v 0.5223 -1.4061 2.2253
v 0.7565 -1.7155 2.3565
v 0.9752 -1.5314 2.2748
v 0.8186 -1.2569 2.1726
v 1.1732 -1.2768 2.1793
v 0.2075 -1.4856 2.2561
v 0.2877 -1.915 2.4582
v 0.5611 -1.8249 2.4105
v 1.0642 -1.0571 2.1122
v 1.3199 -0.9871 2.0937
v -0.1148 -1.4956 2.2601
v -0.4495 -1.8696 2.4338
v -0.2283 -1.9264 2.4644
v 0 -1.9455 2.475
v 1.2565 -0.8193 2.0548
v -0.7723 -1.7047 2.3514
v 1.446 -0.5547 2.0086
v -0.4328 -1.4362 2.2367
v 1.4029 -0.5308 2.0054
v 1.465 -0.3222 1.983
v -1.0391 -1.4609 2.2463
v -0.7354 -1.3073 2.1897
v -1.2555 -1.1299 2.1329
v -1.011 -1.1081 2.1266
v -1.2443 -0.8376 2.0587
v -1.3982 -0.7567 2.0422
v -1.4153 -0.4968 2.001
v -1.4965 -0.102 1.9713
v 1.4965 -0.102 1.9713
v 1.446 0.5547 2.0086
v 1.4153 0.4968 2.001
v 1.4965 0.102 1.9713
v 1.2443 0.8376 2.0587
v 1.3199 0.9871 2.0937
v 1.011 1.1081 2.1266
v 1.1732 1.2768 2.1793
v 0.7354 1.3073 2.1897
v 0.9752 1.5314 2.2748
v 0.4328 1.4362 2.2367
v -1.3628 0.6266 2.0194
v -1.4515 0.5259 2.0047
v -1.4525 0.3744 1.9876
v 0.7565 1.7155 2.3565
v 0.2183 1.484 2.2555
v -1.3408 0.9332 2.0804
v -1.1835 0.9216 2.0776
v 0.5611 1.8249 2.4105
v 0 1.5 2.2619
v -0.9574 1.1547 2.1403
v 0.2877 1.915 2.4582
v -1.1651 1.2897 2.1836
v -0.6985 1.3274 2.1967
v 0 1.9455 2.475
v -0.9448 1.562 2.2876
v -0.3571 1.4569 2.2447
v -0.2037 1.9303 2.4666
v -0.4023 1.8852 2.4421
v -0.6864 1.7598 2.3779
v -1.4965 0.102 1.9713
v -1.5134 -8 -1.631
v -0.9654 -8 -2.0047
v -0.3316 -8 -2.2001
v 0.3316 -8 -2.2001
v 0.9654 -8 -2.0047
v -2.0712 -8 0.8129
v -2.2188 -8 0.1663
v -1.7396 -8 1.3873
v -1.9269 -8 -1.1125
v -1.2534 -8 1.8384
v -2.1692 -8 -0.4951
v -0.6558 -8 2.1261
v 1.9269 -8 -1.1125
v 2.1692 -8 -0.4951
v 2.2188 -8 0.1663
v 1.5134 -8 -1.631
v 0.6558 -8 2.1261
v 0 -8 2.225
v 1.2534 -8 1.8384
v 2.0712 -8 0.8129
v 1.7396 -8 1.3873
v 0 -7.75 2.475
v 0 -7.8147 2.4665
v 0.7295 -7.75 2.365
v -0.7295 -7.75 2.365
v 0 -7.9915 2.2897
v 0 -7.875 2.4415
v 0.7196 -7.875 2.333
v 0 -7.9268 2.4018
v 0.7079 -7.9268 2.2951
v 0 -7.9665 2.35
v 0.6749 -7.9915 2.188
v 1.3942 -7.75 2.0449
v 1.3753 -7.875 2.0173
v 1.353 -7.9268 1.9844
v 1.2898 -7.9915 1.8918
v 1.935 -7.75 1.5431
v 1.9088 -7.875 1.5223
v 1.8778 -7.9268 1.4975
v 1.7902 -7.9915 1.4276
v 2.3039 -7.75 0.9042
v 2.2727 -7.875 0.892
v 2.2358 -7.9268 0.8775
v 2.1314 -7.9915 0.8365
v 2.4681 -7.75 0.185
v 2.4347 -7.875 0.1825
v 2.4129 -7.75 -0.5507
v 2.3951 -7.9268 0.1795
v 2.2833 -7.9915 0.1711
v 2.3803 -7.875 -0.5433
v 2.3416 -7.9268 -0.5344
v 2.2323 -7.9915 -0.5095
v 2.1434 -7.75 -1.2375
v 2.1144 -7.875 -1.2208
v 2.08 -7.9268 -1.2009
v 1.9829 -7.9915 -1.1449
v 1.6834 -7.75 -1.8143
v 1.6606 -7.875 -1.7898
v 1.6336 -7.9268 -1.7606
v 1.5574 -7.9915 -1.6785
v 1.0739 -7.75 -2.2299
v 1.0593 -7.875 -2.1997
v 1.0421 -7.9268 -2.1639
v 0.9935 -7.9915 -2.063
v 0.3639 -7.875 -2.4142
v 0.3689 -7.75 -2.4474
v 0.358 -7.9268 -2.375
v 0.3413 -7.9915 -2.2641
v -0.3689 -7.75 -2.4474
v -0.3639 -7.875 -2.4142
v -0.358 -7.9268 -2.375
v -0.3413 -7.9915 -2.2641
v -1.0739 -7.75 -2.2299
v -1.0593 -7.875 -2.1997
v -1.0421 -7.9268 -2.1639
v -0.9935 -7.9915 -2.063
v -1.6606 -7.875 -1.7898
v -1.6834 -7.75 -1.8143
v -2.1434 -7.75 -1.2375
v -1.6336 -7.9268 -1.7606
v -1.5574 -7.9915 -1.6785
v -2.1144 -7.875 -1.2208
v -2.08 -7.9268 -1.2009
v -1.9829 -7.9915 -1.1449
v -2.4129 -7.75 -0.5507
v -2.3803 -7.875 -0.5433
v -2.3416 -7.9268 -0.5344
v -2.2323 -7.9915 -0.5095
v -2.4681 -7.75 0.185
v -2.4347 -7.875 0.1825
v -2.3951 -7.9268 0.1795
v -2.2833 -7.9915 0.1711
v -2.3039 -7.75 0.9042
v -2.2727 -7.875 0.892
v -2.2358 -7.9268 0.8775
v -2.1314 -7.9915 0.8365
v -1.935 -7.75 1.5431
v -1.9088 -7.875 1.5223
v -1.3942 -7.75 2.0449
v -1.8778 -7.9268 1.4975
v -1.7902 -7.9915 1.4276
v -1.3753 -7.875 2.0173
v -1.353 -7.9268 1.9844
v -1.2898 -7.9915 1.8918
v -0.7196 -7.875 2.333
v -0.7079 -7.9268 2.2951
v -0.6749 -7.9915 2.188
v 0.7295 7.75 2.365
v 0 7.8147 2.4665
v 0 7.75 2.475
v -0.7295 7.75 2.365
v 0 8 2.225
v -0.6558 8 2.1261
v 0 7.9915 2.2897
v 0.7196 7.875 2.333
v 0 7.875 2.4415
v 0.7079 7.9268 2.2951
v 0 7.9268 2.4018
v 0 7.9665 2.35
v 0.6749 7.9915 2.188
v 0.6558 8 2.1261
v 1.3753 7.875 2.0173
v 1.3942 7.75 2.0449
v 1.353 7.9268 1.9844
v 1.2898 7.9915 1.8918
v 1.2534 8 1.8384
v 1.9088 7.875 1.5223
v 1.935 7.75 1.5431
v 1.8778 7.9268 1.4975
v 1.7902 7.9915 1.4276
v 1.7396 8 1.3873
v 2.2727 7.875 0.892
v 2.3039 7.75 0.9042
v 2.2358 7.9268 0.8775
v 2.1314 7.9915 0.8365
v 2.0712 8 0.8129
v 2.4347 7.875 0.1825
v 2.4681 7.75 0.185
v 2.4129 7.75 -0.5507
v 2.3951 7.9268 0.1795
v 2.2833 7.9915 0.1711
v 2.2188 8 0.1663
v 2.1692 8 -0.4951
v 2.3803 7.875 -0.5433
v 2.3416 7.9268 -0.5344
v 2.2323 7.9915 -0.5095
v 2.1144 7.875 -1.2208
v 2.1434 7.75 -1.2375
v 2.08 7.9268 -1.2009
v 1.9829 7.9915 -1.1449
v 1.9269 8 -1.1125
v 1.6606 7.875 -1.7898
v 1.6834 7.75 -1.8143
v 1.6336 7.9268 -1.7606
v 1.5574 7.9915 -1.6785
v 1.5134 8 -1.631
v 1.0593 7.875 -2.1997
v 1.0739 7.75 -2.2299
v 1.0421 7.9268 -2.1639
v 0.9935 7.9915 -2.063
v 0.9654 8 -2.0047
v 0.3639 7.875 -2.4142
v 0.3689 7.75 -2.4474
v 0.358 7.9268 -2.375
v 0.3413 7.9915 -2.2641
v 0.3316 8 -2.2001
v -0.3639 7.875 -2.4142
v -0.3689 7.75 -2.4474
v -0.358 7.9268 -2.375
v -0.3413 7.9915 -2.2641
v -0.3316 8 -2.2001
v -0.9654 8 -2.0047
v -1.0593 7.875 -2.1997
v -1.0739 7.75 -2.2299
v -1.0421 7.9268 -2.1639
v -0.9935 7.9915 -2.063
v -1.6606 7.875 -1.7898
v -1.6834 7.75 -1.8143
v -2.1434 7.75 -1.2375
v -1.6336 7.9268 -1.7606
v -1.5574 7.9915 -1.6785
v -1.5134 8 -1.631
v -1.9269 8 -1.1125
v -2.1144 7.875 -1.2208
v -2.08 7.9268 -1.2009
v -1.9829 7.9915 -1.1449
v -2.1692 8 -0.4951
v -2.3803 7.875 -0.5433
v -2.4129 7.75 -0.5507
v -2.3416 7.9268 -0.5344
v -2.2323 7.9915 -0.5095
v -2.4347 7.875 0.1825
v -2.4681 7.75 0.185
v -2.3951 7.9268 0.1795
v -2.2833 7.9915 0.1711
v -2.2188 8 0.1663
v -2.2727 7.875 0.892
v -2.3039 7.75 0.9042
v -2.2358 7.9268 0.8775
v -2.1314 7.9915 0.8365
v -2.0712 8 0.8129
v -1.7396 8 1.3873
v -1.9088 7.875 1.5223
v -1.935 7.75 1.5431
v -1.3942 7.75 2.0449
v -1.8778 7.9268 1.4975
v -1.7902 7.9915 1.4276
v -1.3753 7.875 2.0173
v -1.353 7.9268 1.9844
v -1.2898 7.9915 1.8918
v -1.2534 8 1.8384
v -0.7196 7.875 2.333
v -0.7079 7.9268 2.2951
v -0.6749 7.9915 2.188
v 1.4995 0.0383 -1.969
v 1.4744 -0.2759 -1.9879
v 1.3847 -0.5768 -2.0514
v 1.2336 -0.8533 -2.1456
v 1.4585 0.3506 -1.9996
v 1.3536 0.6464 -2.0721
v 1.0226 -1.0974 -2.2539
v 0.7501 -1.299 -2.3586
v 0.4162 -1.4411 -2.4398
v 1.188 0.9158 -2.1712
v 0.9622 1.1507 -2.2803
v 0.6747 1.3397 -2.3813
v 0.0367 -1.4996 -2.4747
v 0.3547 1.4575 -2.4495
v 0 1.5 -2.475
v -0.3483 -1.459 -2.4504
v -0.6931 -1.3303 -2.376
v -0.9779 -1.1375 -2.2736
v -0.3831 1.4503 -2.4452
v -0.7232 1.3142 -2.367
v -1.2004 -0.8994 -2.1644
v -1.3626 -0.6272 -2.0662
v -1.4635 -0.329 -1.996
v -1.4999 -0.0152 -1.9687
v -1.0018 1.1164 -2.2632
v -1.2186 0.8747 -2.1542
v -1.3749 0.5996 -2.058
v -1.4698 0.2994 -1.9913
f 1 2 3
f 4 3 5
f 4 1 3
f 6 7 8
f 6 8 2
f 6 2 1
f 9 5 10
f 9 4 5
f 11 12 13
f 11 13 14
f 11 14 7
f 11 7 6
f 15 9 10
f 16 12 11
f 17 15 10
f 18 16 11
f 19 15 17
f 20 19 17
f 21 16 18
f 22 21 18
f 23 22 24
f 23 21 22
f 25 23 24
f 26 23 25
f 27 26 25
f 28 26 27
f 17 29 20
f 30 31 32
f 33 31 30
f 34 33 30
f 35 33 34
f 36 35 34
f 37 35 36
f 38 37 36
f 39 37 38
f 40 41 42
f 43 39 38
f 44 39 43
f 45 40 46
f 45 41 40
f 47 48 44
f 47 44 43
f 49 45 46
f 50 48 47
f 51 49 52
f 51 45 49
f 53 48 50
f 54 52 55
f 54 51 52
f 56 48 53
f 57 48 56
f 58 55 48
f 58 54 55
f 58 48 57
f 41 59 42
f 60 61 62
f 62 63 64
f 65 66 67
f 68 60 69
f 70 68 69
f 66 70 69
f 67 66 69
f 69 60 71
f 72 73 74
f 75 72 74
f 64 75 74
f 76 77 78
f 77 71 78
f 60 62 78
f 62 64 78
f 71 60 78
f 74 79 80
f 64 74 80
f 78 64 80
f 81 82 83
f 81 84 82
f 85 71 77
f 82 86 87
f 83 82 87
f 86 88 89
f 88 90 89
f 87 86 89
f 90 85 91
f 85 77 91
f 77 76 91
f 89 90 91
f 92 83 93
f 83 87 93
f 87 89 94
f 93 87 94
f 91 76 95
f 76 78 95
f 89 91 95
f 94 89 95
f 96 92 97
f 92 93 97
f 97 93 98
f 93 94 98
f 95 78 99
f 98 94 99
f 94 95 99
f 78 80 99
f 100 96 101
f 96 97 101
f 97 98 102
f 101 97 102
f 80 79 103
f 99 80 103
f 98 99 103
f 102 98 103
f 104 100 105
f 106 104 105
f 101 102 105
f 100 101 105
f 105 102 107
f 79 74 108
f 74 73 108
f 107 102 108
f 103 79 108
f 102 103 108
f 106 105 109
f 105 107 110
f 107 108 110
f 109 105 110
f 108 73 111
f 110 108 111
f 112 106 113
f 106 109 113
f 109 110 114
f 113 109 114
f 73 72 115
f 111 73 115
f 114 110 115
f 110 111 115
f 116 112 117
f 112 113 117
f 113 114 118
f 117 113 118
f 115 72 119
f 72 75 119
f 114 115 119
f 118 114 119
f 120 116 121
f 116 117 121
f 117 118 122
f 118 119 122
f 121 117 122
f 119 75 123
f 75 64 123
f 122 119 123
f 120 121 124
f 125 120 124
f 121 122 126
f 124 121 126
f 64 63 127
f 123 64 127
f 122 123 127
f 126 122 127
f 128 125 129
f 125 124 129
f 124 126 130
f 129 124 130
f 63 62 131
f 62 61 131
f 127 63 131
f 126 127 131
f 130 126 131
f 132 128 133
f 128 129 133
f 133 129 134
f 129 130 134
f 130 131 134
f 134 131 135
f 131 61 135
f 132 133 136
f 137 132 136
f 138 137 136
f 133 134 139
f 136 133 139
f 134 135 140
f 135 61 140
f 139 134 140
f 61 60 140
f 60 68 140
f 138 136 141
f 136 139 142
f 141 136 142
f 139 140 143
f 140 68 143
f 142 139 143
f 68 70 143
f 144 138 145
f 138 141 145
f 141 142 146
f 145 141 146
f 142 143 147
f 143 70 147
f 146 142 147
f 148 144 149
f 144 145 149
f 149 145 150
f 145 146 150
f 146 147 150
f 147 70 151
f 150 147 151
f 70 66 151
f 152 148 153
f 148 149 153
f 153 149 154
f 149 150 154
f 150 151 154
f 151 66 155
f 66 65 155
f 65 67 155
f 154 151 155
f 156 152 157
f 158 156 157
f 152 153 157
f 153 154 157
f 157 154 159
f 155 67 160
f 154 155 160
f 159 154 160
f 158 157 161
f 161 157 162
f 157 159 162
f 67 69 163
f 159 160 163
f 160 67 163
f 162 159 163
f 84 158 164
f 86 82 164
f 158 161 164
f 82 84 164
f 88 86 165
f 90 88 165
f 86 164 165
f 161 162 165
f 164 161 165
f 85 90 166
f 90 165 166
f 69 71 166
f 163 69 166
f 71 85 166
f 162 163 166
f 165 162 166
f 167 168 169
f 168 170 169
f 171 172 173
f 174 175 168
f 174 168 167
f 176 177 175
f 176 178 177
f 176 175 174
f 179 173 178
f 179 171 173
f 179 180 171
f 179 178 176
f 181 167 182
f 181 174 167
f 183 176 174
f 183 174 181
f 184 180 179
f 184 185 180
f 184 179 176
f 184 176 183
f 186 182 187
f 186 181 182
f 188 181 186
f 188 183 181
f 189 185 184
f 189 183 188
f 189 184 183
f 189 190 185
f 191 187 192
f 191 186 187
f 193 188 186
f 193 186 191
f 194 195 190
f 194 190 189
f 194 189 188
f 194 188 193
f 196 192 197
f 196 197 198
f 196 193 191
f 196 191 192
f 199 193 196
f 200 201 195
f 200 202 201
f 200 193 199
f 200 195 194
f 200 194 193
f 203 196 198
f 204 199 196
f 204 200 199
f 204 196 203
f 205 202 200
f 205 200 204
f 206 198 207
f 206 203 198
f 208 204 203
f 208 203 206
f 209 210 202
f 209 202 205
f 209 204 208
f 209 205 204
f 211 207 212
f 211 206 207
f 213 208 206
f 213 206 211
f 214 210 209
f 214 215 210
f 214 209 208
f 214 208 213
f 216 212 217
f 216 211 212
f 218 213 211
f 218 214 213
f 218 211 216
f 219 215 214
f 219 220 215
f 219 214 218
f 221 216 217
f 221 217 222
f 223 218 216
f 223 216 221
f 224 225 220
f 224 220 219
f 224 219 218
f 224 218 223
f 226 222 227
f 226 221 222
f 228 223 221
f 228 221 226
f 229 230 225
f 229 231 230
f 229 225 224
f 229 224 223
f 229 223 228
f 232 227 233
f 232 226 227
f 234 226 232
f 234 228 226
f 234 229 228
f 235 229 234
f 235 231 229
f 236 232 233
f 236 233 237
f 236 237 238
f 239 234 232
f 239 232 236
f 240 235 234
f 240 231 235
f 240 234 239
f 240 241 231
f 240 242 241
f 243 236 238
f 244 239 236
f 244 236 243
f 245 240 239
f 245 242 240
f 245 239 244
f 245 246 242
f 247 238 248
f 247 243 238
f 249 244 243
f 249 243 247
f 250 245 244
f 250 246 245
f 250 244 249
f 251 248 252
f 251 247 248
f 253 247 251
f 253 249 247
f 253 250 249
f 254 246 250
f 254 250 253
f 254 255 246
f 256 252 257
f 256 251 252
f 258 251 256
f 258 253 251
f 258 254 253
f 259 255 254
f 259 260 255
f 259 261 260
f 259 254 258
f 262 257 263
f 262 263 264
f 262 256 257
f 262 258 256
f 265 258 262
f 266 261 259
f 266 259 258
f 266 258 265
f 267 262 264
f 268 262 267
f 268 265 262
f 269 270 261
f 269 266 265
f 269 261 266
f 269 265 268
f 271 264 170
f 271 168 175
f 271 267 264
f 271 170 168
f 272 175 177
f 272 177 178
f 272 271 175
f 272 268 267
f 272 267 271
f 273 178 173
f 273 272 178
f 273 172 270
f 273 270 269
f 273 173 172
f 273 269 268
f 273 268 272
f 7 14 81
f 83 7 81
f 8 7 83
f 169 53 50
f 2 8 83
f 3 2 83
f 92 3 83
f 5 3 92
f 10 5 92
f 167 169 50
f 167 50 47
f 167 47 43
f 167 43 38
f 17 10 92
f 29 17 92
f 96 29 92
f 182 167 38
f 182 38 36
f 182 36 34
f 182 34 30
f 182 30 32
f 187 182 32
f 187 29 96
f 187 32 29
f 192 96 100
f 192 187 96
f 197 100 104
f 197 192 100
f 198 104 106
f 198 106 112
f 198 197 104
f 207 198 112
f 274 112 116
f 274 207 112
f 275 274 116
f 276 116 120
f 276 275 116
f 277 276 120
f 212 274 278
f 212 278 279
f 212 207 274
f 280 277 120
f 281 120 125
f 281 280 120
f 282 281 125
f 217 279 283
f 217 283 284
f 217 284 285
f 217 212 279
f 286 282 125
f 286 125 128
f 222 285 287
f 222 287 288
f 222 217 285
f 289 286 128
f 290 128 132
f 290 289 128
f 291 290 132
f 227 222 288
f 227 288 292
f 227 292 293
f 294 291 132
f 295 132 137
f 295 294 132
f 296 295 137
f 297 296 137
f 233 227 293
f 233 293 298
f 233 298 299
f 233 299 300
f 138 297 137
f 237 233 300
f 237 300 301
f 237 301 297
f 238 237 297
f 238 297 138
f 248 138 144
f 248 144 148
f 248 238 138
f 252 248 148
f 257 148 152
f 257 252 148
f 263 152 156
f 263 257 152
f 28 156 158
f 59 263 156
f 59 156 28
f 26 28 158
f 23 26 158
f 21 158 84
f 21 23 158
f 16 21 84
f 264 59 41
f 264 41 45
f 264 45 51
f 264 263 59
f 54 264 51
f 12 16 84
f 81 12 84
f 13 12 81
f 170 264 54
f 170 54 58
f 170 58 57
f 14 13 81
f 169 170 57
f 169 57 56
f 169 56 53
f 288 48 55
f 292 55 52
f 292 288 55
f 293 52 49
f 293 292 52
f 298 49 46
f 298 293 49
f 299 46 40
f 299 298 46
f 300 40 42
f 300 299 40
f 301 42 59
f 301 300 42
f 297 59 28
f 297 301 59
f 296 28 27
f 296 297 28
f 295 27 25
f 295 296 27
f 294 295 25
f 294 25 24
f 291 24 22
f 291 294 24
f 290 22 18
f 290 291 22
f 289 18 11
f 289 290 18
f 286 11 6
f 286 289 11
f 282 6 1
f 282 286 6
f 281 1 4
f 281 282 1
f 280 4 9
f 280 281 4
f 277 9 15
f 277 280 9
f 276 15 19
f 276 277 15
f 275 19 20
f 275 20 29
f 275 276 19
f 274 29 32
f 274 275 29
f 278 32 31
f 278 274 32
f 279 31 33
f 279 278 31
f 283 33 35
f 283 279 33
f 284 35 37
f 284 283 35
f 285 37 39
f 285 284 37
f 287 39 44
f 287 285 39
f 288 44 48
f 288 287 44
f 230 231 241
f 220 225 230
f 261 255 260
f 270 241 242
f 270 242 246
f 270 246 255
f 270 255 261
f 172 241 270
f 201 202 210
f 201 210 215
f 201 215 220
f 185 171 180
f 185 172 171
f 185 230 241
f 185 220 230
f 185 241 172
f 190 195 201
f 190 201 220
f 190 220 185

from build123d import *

# Parameters (mm, degrees)
SKETCH1_R               = 2.475
BOSS_EXTRUDE1_DEPTH     = 8
CUT_EXTRUDE1_DEPTH      = 9.732196173
CUT_EXTRUDE1_DEPTH_BACK = 9.732196173
SKETCH2_R               = 1.5
CUT_EXTRUDE3_DEPTH      = 9.732196321
CUT_EXTRUDE3_DEPTH_BACK = 9.732196321
SKETCH5_R               = 4
FILLET1_R               = 0.25


with BuildPart() as part:
    # Sketch1 → Boss-Extrude1 (new, symmetric)
    with BuildSketch(Plane(origin=(0, 0, 0), x_dir=(1, 0, 0), z_dir=(0, 1, 0))):
        with Locations(Location((0, 0, 0), (0, 0, 270))):
            Circle(SKETCH1_R)
    extrude(amount=BOSS_EXTRUDE1_DEPTH, both=True)

    # Sketch2 → Cut-Extrude1 (cut, two sides: drawn at the far end of the back side and taken through both)
    with BuildSketch(Plane.XY.offset(-CUT_EXTRUDE1_DEPTH_BACK)):
        with Locations(Location((0, 0, 0), (0, 0, 89.999999987))):
            Circle(SKETCH2_R)
    extrude(amount=CUT_EXTRUDE1_DEPTH + CUT_EXTRUDE1_DEPTH_BACK, mode=Mode.SUBTRACT)

    # Sketch5 → Cut-Extrude3 (cut, two sides: drawn at the far end of the back side and taken through both)
    with BuildSketch(Plane(origin=(0, 0, 0), x_dir=(0, 0, -1), z_dir=(1, 0, 0)).offset(-CUT_EXTRUDE3_DEPTH_BACK)):
        with Locations((-5.97, 0)):
            Circle(SKETCH5_R)
    extrude(amount=CUT_EXTRUDE3_DEPTH + CUT_EXTRUDE3_DEPTH_BACK, mode=Mode.SUBTRACT)

    # Fillet1
    fillet1_edges = [part.edges().sort_by_distance(p)[0] for p in [
        (0, -8, -2.475),
        (0, 8, -2.475),
    ]]
    fillet(fillet1_edges, radius=FILLET1_R)


solid = part.part
